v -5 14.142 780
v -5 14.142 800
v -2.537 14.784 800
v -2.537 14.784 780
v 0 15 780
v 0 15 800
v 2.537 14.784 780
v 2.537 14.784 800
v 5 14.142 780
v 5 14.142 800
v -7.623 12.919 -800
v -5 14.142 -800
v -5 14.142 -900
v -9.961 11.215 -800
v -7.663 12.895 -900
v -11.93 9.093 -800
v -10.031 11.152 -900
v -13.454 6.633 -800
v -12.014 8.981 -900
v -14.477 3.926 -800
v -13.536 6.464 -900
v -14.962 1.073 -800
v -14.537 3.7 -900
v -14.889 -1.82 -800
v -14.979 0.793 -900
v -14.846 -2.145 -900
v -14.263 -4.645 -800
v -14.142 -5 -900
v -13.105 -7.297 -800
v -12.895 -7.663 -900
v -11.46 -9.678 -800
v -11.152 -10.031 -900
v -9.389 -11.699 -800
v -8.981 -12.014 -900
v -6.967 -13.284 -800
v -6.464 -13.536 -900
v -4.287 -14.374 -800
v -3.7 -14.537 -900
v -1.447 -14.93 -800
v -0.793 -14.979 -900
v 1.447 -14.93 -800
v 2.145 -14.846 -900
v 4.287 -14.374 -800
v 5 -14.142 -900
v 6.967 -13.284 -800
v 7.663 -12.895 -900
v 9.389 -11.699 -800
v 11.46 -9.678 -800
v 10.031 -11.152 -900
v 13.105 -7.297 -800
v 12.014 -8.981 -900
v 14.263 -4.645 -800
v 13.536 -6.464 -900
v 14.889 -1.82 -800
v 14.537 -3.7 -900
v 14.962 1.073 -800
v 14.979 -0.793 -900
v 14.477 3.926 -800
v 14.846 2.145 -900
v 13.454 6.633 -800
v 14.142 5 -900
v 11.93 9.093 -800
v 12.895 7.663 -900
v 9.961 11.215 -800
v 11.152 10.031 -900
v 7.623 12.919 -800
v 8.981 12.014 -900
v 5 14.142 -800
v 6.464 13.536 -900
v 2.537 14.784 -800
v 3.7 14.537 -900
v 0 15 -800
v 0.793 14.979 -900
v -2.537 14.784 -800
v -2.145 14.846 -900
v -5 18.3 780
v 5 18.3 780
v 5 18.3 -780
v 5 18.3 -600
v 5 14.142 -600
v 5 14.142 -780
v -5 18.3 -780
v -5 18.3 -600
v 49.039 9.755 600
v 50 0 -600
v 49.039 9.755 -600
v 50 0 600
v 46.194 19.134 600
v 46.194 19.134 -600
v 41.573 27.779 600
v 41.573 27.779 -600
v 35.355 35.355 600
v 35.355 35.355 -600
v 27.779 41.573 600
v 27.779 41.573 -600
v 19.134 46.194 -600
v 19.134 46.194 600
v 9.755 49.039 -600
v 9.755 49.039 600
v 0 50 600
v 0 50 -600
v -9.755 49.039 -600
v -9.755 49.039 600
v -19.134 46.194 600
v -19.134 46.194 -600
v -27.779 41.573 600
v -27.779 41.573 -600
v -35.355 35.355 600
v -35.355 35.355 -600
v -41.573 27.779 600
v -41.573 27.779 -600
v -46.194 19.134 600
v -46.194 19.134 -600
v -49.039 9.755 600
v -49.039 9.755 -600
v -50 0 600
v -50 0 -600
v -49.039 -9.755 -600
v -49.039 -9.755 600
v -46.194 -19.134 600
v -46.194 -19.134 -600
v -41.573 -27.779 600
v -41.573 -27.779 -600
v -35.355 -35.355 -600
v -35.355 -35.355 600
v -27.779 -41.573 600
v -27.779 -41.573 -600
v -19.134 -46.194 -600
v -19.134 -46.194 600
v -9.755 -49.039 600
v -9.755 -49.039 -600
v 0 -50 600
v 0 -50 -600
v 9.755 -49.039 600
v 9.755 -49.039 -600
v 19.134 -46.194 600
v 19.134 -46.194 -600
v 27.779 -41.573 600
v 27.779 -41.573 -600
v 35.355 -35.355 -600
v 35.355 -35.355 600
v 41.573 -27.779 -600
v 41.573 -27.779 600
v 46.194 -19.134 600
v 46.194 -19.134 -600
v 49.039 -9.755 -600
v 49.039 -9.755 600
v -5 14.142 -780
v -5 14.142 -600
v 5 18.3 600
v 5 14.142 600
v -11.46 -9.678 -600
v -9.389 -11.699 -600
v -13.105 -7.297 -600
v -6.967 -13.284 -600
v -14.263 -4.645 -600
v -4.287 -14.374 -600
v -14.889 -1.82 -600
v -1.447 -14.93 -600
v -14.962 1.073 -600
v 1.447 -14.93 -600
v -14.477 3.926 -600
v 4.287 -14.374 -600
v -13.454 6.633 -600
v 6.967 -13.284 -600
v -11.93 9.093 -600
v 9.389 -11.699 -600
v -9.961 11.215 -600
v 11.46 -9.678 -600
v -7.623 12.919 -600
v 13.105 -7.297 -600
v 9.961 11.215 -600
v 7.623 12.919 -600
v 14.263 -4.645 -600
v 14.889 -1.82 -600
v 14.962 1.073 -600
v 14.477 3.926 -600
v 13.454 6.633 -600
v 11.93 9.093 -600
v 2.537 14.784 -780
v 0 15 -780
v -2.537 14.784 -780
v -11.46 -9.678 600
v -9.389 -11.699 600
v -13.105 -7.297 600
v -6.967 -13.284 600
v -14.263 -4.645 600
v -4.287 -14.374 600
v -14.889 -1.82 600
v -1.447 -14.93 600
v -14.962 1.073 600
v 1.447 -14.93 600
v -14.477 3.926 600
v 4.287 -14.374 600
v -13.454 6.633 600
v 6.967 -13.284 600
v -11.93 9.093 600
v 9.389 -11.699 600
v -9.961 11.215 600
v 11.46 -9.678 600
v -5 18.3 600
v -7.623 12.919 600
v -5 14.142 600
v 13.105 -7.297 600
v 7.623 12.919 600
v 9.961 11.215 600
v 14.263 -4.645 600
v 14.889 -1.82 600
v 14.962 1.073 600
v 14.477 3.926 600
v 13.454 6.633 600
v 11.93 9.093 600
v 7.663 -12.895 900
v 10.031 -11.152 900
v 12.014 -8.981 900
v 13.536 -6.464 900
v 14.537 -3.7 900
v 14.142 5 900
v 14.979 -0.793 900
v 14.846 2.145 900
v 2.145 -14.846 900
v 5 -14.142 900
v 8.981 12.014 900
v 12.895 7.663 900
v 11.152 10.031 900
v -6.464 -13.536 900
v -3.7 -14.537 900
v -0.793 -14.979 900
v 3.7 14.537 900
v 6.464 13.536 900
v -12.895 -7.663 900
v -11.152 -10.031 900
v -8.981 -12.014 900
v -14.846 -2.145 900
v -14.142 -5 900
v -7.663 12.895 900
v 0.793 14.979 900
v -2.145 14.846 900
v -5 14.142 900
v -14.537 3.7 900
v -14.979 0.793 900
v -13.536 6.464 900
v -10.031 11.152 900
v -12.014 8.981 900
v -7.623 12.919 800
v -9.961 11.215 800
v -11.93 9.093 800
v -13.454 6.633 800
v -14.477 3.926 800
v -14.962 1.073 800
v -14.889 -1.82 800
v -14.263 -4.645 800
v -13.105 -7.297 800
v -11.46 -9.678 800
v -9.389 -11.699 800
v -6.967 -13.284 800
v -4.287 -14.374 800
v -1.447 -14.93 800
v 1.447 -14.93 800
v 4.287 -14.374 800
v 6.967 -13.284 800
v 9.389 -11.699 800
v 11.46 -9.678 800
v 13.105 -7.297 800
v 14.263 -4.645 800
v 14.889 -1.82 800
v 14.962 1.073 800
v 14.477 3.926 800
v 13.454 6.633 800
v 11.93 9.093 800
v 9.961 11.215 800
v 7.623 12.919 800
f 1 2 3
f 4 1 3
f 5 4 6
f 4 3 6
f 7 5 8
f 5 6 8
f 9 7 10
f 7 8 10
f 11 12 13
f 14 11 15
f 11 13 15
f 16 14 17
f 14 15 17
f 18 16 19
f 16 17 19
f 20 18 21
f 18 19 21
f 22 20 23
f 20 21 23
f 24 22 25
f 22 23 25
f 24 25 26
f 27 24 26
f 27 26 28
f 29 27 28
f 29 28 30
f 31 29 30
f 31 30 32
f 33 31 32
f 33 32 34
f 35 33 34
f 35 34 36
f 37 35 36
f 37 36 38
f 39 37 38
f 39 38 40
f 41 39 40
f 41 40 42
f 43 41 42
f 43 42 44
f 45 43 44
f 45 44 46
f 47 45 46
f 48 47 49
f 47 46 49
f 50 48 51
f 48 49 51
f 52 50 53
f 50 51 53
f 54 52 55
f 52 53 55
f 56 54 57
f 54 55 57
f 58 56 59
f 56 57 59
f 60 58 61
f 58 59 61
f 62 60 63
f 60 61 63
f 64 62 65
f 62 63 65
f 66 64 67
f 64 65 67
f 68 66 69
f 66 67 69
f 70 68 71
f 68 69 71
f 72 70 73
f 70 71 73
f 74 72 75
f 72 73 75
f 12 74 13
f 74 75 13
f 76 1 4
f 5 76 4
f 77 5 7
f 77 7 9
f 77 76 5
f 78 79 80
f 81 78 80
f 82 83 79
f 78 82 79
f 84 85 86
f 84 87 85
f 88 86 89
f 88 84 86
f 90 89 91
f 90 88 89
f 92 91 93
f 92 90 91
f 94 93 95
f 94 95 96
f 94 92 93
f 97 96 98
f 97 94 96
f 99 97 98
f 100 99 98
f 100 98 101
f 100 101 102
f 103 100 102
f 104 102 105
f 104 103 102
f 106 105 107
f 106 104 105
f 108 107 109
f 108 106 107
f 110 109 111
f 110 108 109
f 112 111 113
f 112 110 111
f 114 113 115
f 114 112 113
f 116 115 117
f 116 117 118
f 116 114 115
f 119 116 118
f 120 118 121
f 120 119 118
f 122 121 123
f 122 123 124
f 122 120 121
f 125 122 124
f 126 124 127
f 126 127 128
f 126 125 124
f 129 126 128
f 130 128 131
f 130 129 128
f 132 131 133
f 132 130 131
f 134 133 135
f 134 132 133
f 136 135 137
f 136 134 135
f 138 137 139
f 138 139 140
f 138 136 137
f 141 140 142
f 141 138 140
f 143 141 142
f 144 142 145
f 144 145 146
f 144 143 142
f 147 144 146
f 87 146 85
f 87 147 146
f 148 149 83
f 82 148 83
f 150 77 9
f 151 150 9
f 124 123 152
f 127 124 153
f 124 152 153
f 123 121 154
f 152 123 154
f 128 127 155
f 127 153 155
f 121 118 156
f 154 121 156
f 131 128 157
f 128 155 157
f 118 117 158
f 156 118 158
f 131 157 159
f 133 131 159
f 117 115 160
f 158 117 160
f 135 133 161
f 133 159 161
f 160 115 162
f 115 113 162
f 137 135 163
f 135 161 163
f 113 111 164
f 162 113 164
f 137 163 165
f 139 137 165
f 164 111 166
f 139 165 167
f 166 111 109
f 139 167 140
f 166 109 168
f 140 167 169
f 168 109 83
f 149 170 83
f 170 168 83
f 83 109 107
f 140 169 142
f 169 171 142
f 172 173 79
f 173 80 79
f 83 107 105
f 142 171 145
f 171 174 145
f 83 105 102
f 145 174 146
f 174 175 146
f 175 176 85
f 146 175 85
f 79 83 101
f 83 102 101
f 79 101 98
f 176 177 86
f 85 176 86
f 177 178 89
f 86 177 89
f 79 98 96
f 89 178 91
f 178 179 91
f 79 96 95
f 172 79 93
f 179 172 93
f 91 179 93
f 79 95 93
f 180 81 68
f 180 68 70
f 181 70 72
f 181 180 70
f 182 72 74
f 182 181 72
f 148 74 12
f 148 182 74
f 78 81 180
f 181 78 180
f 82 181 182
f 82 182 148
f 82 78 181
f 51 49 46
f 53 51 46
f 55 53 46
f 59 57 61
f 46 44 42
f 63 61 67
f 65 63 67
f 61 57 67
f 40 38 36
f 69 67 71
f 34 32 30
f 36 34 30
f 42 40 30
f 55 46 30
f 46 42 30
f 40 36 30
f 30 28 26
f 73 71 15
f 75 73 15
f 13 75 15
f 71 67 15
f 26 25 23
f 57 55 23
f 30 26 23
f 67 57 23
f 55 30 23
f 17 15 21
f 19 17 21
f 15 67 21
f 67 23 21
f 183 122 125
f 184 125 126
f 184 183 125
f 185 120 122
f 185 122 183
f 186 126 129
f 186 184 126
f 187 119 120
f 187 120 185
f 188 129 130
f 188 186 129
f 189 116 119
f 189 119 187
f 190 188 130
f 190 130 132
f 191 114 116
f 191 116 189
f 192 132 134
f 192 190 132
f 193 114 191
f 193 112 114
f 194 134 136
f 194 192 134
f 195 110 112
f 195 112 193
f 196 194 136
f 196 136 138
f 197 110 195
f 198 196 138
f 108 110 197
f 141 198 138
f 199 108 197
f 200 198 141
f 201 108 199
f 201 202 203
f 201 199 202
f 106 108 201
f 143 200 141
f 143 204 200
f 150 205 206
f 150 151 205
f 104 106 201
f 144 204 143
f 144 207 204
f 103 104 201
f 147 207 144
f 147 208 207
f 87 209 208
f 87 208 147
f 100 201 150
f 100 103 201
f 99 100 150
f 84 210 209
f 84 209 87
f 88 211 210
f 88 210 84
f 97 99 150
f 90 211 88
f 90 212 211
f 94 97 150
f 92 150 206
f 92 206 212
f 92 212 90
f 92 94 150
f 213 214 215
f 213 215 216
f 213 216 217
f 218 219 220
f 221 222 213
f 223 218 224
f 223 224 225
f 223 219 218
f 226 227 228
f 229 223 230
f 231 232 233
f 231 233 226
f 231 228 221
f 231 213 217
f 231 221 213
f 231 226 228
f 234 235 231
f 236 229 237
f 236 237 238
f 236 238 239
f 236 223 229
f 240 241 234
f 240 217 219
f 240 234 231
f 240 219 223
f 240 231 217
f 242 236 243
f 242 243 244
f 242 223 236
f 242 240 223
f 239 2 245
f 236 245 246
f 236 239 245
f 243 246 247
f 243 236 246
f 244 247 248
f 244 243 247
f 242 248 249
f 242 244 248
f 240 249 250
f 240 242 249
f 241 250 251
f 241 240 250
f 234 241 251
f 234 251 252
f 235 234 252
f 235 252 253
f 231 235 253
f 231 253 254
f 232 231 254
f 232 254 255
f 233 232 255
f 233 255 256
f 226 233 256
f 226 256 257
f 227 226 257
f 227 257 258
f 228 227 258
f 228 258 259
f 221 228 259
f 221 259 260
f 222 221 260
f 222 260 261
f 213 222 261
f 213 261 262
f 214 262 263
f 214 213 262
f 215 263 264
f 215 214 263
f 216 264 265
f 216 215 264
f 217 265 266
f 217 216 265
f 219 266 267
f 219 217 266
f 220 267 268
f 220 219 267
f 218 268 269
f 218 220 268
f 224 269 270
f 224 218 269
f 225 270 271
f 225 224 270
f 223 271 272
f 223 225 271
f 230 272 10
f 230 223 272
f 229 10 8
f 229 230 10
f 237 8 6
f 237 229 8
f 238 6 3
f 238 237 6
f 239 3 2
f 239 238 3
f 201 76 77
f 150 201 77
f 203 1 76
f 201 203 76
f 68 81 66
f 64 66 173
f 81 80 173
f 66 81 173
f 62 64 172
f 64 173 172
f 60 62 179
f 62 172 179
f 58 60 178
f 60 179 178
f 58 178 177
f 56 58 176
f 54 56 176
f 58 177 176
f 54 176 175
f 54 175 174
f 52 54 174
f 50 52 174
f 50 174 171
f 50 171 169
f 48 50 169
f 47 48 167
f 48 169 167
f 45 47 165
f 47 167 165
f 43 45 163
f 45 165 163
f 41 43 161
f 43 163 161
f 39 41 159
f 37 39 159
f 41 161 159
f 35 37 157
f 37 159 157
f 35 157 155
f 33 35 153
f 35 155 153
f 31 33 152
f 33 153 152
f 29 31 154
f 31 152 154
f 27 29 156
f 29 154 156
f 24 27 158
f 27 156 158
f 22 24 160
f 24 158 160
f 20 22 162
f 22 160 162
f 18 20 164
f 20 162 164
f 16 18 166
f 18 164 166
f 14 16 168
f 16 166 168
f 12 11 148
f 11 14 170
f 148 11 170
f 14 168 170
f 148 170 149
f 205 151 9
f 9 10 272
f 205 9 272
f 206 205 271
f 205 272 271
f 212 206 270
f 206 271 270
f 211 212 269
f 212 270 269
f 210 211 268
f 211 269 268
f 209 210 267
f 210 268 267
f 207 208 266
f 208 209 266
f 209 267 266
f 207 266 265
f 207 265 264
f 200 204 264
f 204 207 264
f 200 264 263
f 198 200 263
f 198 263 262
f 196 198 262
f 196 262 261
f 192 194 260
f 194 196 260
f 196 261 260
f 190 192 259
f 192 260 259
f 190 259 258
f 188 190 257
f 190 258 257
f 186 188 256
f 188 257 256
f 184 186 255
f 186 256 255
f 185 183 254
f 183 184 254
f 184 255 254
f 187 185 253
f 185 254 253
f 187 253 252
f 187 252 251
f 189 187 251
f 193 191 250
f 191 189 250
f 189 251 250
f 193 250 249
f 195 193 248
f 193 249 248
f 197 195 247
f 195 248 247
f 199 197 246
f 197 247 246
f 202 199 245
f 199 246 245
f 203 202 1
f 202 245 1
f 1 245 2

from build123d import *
from build123d.topology import SkipClean

# Parameters (mm, degrees)
BOSS_EXTRUDE4_DEPTH = 800
SKETCH6_R           = 50
BOSS_EXTRUDE5_DEPTH = 600
BOSS_EXTRUDE6_START = 900
SKETCH7_R           = 15
BOSS_EXTRUDE6_DEPTH = 100
CUT_EXTRUDE1_DEPTH  = 20
CUT_EXTRUDE2_START  = -20
CUT_EXTRUDE2_DEPTH  = 20


with BuildPart() as part:
    # Sketch4 → Boss-Extrude4 (new, symmetric)
    with BuildSketch(Plane.XY):
        with BuildLine():
            Line((-5, 14.142135624), (-5, 18.3))
            Line((-5, 18.3), (5, 18.3))
            Line((5, 18.3), (5, 14.142135624))
            ThreePointArc((5, 14.142135624), (0, -15), (-5, 14.142135624))
        make_face()
    extrude(amount=BOSS_EXTRUDE4_DEPTH, both=True)

    # Sketch6 → Boss-Extrude5 (add, symmetric)
    with BuildSketch(Plane.XY):
        Circle(SKETCH6_R)
    extrude(amount=BOSS_EXTRUDE5_DEPTH, both=True)

    # Sketch7 → Boss-Extrude6 (add)
    with BuildSketch(Plane.XY.offset(BOSS_EXTRUDE6_START)):
        Circle(SKETCH7_R)
    boss_extrude6 = extrude(amount=-BOSS_EXTRUDE6_DEPTH)

    # Mirror1: Boss-Extrude6 across plane
    add(boss_extrude6.mirror(Plane.XY))

    # Sketch8 → Cut-Extrude1 (cut)
    with BuildSketch(Plane.XY.offset(800)):
        with BuildLine():
            Line((5, 14.142135624), (5, 18.3))
            Line((5, 18.3), (-5, 18.3))
            Line((-5, 18.3), (-5, 14.142135624))
            ThreePointArc((-5, 14.142135624), (0, 15), (5, 14.142135624))
        make_face()
    extrude(amount=-CUT_EXTRUDE1_DEPTH, mode=Mode.SUBTRACT)

    # Sketch9 → Cut-Extrude2 (cut)
    with SkipClean():  # the faces are left unmerged after this step: merging them gives an invalid solid
        with BuildSketch(Plane(origin=(0, 0, -800), x_dir=(-1, 0, 0), z_dir=(0, 0, -1)).offset(CUT_EXTRUDE2_START)):
            with BuildLine():
                Line((-5, 18.3), (-5, 14.142135624))
                ThreePointArc((-5, 14.142135624), (0, 15), (5, 14.142135624))
                Line((5, 14.142135624), (5, 18.3))
                Line((5, 18.3), (-5, 18.3))
            make_face()
        extrude(amount=CUT_EXTRUDE2_DEPTH, mode=Mode.SUBTRACT)


solid = part.part
